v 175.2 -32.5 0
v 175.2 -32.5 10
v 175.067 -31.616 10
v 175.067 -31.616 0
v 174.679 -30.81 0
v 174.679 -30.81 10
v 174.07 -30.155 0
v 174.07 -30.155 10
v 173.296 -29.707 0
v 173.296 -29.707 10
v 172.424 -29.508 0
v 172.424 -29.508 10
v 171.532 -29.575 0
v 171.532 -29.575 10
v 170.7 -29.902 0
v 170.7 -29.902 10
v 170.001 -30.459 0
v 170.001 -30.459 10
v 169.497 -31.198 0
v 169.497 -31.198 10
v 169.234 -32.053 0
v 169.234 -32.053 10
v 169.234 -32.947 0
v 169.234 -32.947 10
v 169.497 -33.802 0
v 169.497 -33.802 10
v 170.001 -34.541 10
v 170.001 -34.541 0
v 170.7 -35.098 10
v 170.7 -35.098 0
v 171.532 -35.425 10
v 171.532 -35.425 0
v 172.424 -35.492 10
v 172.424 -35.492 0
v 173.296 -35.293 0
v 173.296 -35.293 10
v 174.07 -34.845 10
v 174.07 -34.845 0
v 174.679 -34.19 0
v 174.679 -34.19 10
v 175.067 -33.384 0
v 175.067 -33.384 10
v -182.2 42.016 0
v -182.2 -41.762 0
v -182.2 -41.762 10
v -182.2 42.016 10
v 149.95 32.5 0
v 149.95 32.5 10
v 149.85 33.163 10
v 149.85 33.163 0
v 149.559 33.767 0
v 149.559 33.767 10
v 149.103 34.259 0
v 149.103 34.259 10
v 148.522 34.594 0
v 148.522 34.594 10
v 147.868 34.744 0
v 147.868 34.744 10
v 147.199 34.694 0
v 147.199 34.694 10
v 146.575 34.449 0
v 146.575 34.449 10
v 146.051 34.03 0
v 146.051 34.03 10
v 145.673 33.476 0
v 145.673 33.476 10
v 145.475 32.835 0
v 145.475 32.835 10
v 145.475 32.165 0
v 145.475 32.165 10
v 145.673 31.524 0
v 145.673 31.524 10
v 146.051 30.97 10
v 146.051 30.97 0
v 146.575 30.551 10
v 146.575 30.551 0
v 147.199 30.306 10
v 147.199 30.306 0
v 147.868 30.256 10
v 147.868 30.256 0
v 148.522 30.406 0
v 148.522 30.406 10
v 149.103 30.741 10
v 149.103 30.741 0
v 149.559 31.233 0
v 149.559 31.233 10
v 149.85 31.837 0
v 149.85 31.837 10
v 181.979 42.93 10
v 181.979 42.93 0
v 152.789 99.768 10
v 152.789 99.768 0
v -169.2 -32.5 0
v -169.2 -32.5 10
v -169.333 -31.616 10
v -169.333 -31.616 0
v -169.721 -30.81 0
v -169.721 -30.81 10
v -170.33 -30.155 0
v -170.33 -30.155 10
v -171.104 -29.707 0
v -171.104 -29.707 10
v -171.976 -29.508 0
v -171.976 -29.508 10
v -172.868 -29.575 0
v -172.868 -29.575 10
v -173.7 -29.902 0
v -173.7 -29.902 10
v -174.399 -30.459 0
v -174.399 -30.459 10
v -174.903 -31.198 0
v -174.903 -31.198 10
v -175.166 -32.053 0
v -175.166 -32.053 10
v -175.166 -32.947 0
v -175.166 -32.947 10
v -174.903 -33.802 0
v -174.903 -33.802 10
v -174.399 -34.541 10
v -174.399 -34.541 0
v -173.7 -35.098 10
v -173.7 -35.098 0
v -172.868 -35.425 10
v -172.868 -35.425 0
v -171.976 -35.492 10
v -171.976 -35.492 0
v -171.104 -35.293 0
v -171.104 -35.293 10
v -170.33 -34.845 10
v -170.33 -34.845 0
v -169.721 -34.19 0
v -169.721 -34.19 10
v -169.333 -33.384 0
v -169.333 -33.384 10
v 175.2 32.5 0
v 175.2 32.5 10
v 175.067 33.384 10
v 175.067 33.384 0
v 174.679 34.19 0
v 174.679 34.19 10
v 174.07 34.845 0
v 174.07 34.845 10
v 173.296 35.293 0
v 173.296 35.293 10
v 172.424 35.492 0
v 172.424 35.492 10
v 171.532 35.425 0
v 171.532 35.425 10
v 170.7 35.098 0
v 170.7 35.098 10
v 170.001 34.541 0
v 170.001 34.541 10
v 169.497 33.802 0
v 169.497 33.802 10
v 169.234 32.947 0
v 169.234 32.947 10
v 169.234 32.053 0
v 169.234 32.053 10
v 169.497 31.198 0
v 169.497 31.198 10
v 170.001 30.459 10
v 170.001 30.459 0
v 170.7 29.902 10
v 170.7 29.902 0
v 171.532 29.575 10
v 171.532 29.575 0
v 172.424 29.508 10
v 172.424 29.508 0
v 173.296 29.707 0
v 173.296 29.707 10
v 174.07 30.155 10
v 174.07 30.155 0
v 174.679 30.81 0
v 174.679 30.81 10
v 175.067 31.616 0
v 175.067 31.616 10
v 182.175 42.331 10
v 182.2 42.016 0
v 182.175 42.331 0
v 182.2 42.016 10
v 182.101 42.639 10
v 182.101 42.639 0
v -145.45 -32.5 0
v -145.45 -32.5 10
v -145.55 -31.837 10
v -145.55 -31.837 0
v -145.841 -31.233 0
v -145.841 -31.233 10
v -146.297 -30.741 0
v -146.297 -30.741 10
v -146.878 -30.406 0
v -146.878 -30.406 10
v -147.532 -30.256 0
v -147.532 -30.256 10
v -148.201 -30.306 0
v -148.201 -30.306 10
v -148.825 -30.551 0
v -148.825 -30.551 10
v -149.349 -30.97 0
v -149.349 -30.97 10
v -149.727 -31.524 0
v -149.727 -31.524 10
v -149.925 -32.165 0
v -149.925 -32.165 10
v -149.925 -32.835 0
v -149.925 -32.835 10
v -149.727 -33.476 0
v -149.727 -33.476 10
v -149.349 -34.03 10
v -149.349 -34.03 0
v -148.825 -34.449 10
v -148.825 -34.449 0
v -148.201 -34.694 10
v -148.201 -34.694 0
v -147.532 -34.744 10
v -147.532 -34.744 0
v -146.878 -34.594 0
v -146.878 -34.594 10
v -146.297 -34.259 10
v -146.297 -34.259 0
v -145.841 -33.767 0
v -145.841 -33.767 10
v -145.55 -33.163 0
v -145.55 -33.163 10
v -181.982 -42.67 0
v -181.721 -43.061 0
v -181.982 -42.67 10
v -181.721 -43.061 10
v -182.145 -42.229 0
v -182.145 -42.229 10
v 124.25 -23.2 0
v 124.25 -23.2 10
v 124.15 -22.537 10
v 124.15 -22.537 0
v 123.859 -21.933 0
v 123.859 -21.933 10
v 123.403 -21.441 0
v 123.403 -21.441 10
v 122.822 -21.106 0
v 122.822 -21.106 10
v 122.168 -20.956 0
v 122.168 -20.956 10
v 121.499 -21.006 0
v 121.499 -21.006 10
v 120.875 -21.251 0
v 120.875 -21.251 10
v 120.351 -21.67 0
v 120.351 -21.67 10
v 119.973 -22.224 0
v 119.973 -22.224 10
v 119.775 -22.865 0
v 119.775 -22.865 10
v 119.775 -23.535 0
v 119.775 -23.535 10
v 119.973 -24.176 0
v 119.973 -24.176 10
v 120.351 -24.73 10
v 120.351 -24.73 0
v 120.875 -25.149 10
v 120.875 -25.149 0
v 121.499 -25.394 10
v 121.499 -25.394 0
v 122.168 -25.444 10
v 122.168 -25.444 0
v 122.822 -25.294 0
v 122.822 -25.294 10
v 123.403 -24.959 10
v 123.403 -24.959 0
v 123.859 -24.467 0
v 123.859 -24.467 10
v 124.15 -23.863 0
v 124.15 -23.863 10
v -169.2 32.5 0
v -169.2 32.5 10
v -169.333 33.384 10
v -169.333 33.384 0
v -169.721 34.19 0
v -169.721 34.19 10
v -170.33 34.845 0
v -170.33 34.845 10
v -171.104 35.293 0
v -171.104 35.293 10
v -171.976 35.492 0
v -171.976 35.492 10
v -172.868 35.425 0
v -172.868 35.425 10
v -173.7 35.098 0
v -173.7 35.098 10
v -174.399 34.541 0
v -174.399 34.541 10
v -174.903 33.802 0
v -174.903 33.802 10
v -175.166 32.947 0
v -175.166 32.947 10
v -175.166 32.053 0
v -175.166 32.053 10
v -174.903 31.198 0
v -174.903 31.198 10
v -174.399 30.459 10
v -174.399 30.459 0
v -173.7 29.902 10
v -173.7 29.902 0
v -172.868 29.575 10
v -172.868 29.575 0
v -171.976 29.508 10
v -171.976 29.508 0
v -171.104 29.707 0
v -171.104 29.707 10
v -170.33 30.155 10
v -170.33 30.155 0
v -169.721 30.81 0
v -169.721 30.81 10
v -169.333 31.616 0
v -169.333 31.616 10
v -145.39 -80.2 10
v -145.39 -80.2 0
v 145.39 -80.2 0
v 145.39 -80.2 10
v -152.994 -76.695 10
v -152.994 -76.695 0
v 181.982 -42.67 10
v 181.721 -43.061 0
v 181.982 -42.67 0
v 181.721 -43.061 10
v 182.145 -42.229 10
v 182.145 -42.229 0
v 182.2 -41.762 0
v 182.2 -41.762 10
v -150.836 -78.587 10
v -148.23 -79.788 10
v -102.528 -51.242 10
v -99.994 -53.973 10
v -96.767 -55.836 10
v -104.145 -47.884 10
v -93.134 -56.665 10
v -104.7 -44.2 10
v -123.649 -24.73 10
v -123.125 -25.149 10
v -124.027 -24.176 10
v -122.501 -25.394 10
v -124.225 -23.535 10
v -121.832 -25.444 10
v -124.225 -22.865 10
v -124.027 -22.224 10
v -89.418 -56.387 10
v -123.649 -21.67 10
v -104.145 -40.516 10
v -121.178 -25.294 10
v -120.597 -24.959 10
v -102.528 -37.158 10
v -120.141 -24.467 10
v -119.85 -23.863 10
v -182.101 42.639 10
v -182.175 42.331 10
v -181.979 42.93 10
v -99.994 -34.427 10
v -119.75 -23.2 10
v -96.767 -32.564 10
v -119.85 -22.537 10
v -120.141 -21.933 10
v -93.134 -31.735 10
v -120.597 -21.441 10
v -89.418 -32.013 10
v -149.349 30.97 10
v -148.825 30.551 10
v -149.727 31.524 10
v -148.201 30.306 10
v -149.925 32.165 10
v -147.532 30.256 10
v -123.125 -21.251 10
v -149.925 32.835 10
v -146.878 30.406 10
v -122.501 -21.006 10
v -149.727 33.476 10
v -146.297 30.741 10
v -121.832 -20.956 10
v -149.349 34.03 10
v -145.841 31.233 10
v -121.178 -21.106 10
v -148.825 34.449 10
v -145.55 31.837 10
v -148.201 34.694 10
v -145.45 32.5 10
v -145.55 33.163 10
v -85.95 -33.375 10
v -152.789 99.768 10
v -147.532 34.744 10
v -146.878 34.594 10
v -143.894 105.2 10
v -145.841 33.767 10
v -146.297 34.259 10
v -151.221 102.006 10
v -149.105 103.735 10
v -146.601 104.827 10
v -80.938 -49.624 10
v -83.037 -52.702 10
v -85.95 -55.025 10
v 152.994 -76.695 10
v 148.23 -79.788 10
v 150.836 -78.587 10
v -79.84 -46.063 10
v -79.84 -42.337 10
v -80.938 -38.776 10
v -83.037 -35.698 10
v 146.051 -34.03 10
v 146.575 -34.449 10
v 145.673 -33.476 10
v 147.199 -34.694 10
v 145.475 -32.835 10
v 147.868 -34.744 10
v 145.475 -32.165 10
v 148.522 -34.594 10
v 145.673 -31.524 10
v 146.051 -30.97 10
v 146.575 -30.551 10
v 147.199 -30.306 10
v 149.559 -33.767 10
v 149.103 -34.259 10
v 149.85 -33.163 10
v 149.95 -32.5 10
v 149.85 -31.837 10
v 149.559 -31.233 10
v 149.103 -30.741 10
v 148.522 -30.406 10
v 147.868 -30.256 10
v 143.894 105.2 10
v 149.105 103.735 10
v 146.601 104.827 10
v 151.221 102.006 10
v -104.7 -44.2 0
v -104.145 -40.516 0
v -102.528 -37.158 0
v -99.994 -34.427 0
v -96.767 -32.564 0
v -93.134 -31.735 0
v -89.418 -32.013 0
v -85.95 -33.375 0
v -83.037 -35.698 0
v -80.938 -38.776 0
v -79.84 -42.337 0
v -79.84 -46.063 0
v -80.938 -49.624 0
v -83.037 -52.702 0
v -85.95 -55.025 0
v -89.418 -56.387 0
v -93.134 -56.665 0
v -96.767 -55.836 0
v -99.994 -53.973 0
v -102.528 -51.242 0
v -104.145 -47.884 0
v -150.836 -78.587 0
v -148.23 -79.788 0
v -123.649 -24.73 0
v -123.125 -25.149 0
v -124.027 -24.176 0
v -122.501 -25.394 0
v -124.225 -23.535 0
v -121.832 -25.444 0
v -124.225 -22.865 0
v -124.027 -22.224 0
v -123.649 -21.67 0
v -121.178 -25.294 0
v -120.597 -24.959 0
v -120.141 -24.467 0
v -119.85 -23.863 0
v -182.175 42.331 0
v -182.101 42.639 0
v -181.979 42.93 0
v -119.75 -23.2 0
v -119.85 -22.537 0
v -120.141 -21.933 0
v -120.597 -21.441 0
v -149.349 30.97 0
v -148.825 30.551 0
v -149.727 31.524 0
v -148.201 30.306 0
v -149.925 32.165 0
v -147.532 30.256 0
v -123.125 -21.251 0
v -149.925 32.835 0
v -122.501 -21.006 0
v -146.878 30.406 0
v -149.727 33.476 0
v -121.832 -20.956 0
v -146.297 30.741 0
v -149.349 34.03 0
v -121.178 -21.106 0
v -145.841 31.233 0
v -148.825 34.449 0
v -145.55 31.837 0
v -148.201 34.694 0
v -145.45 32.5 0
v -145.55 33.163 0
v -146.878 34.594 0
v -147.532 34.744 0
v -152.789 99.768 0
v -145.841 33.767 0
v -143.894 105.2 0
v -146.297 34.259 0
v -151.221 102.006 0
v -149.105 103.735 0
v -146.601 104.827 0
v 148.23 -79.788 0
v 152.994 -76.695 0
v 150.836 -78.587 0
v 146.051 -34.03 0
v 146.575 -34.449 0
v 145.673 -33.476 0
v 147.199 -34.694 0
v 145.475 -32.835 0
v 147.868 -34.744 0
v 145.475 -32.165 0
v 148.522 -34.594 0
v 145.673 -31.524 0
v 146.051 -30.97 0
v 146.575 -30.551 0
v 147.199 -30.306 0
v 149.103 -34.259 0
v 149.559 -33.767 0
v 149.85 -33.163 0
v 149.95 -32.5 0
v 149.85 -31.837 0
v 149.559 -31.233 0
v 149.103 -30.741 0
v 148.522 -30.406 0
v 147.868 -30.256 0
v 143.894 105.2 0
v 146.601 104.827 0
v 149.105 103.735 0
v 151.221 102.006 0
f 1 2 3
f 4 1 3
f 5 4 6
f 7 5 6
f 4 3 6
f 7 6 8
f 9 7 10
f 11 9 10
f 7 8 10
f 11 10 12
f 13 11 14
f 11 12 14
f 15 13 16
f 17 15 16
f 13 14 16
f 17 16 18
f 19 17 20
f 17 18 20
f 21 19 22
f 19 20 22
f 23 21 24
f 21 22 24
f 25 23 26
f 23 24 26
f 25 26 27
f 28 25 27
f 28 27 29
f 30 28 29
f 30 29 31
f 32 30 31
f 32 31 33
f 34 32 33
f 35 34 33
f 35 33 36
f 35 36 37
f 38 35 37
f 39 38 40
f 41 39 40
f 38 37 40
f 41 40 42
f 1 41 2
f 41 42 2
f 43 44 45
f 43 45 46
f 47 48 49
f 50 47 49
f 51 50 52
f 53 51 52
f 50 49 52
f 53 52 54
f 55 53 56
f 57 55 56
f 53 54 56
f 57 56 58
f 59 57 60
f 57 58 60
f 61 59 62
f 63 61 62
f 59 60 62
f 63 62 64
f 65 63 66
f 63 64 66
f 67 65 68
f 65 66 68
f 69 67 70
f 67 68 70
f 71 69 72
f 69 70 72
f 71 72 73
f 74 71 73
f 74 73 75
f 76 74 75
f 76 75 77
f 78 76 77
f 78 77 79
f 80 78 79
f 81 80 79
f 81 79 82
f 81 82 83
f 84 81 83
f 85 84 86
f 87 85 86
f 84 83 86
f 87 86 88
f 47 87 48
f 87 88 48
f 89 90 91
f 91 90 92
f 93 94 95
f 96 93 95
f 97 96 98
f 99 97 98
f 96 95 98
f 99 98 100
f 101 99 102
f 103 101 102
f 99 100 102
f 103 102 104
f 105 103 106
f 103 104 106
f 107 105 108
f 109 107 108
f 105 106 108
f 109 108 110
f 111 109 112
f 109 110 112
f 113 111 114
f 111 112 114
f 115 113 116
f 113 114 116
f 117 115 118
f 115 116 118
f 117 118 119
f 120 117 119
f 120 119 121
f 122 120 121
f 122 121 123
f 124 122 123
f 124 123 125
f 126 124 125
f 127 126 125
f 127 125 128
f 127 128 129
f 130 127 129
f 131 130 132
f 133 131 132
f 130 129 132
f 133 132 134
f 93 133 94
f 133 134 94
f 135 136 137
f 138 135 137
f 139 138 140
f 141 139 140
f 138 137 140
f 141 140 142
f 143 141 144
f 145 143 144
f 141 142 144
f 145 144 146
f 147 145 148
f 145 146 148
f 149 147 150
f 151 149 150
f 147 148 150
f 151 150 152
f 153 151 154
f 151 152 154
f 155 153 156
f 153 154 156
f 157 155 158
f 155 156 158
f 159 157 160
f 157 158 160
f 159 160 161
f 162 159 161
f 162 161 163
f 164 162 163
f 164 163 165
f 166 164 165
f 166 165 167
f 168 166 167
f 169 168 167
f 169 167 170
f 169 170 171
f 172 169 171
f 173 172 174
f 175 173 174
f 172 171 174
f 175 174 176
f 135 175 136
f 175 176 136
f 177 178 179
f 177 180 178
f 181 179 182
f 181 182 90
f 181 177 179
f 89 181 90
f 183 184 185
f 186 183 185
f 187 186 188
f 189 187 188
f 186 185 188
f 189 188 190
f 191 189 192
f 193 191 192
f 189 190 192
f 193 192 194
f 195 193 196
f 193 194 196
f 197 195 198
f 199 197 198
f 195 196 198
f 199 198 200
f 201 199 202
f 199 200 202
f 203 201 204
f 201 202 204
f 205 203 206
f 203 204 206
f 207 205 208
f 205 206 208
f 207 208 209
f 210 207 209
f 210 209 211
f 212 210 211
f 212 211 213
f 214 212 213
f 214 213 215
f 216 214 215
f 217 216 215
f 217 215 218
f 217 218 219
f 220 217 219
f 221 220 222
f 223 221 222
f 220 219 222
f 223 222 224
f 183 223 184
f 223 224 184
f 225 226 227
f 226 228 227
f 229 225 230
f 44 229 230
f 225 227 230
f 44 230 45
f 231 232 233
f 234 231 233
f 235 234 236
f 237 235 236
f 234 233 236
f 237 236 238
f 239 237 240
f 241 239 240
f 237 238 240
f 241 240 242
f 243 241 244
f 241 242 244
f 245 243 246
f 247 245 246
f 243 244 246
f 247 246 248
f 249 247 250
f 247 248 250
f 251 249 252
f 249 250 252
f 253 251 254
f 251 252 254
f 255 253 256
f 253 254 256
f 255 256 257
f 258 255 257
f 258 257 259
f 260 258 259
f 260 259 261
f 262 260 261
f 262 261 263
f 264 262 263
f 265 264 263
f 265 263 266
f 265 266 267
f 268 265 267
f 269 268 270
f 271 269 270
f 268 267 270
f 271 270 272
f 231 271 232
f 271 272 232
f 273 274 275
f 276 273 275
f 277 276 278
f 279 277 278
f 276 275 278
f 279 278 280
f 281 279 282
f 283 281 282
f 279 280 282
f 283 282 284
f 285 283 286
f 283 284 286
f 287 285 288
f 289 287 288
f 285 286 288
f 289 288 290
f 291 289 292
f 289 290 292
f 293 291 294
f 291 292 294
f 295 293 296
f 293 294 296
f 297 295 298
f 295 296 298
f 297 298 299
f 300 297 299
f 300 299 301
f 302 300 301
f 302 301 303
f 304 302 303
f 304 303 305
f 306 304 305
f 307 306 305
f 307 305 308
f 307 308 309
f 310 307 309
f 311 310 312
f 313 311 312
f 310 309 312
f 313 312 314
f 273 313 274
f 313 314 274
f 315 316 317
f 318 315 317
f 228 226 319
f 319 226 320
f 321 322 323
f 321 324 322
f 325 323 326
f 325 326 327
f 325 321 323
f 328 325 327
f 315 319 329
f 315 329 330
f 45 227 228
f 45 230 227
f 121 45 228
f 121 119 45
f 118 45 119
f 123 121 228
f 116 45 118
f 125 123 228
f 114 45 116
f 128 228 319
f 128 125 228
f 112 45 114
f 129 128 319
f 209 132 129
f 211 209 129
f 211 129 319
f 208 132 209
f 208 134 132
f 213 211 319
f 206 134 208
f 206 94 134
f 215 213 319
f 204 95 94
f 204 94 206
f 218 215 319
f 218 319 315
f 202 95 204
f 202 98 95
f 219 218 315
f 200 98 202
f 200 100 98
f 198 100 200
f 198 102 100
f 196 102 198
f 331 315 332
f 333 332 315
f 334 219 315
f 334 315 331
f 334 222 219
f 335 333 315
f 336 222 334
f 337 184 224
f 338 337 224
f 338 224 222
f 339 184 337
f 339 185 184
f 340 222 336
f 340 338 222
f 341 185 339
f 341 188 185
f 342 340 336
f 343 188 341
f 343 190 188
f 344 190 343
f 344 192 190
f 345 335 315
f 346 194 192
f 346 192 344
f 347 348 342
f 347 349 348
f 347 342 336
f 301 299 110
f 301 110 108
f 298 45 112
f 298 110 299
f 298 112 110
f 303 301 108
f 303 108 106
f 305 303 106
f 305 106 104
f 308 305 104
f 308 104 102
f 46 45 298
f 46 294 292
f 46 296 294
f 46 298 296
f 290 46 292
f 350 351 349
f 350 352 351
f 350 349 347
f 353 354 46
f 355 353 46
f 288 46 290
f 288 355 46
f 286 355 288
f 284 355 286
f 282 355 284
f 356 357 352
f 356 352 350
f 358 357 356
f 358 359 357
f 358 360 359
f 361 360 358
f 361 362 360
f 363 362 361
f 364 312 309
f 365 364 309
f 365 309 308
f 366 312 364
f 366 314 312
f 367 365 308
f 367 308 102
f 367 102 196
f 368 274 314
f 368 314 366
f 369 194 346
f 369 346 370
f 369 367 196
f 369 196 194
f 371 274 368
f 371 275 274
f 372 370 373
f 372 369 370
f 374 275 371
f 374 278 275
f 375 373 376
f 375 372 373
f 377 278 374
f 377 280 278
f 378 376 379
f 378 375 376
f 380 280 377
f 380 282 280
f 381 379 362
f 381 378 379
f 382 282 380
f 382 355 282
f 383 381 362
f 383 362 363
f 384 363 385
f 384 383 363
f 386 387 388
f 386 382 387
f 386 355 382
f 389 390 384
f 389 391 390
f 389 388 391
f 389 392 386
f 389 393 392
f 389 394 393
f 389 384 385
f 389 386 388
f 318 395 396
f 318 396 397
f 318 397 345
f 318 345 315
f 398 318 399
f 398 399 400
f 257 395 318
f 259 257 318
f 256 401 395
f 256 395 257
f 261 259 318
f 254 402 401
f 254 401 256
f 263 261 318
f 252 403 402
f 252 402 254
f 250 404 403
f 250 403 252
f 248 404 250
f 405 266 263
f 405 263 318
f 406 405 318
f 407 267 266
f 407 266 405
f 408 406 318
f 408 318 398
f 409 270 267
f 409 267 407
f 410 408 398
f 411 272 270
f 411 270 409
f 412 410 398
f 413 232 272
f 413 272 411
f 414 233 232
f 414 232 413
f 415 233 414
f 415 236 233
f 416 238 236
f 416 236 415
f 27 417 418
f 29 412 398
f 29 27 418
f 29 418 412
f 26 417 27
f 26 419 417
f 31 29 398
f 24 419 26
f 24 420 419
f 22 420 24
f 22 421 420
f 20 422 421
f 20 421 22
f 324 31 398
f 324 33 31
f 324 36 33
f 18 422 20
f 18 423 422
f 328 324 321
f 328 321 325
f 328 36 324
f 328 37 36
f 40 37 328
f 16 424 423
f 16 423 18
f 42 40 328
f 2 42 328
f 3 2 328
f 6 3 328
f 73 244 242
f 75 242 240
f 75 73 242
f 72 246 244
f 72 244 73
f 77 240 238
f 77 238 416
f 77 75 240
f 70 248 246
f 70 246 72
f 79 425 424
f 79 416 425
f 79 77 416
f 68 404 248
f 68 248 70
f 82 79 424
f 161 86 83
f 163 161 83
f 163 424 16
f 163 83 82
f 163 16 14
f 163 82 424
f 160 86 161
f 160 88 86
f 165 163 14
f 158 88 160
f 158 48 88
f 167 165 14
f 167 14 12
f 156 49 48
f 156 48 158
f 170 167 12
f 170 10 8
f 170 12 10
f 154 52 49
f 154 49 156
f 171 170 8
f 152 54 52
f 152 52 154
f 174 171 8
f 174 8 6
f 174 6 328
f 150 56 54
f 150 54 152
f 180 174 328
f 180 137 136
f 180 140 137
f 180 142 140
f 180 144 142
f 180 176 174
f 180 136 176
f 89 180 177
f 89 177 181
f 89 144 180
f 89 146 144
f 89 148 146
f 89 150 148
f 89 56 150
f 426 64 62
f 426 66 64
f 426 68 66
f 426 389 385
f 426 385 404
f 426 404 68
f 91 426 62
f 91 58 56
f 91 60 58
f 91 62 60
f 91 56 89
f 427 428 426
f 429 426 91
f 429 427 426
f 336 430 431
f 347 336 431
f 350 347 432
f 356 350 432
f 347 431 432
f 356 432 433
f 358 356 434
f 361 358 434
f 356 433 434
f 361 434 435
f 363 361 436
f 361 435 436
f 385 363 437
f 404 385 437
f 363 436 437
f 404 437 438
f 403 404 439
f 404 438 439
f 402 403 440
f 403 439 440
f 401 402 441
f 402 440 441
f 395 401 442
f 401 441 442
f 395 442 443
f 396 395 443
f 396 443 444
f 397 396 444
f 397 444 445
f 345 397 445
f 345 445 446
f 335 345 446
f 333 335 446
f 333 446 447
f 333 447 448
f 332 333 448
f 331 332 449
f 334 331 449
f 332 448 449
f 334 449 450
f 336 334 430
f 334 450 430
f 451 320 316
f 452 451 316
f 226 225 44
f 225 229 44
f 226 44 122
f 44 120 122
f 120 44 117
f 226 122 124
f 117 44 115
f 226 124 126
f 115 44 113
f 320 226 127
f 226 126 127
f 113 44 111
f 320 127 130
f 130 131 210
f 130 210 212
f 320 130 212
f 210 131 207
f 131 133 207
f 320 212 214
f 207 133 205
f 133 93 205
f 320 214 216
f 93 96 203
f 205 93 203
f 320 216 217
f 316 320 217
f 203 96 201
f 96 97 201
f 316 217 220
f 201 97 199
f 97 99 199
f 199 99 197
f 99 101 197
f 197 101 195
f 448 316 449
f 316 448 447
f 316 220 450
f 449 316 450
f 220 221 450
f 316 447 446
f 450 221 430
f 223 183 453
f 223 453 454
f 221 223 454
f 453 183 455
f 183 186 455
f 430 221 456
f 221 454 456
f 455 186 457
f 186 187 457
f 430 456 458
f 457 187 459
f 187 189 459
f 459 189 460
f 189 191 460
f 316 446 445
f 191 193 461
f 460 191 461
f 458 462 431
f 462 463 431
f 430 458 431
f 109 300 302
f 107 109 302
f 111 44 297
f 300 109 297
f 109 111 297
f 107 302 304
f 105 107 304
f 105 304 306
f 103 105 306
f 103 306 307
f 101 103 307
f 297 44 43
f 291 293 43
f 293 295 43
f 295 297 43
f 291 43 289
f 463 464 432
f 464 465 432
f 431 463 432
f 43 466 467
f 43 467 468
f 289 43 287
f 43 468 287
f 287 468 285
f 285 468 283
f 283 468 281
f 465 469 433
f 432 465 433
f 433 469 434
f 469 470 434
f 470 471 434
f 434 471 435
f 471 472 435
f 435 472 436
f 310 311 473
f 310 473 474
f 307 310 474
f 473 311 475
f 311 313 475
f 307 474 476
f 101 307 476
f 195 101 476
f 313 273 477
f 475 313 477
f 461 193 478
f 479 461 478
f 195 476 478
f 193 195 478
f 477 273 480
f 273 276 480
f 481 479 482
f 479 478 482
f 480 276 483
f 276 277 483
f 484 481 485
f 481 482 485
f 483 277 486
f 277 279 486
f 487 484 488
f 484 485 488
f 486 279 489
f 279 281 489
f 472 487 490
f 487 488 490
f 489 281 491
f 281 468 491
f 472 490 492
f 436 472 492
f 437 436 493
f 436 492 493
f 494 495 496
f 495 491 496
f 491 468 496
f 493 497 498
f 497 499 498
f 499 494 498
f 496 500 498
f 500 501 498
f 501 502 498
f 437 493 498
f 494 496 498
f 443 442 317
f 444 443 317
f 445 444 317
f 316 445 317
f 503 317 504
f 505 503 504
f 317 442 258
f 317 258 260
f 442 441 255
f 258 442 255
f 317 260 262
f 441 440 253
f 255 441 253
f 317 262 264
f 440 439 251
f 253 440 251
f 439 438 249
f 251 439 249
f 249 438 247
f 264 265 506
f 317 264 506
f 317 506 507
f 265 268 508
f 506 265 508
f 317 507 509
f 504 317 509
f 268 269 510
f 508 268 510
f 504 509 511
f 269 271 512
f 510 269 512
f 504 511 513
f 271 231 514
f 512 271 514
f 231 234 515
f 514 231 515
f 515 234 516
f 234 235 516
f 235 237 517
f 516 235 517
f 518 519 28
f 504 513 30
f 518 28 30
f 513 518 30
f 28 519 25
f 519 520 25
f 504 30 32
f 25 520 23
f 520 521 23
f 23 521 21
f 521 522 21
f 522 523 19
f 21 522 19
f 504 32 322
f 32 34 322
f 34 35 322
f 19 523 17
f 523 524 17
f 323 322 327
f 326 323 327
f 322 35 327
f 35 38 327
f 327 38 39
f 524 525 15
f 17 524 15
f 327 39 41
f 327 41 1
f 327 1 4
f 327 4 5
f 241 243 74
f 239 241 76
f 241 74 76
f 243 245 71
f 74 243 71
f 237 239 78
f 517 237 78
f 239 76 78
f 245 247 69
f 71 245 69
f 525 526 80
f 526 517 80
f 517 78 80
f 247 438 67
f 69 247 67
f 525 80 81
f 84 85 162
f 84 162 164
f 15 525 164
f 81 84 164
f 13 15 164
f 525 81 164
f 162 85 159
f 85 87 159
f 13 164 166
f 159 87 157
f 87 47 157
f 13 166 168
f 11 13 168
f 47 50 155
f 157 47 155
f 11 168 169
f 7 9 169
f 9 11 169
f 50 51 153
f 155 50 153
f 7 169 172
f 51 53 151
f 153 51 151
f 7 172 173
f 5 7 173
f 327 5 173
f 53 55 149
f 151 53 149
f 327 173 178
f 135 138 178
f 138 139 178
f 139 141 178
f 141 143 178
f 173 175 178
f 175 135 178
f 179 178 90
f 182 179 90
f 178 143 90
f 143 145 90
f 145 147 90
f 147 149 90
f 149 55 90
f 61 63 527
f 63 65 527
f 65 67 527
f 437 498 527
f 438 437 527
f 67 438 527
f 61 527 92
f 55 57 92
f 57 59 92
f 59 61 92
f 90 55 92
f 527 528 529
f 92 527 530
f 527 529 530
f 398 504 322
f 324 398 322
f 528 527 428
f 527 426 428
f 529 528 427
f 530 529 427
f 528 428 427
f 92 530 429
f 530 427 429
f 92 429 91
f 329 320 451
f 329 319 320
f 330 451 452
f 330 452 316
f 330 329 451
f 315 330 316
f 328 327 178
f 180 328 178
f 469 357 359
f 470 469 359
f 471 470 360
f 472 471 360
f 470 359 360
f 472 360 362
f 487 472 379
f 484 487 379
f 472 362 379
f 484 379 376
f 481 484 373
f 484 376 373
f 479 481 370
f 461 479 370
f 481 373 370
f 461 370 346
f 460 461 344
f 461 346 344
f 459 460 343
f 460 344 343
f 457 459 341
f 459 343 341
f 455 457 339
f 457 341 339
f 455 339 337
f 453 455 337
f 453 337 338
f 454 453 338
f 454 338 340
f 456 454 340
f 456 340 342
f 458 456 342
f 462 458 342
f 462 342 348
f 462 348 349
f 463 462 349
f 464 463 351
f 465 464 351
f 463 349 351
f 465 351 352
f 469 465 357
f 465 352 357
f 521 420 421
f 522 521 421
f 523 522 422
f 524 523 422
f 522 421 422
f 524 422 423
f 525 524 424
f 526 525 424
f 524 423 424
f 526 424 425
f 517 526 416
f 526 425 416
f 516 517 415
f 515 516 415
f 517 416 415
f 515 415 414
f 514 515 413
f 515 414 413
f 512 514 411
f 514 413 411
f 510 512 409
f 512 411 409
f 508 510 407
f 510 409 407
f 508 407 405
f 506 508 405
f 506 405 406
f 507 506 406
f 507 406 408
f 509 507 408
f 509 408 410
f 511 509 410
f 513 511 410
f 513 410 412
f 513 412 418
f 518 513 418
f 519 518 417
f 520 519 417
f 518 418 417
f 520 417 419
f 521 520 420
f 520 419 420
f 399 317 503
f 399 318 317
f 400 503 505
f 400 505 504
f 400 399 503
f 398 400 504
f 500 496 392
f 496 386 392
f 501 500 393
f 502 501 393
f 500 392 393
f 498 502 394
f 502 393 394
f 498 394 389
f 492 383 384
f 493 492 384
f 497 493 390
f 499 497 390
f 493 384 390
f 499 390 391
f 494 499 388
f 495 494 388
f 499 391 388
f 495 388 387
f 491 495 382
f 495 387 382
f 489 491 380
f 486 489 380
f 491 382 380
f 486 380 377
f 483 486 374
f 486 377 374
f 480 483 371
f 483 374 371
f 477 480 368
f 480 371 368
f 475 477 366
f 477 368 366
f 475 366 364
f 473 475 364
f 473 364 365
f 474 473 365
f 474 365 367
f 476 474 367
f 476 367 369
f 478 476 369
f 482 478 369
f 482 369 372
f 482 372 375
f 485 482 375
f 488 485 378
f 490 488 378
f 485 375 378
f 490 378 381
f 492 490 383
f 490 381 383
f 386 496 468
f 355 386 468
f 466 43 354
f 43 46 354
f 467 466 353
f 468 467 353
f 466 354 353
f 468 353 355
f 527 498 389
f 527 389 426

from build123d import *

# Parameters (mm, degrees)
ESQUISSE1_W             = 364.4
ESQUISSE1_H             = 85
ESQUISSE1_W_2           = 300
ESQUISSE1_H_2           = 62.7
ESQUISSE1_H_3           = 37.7
BOSS_EXTRU_1_DEPTH      = 10
ESQUISSE3_R             = 2.25
ESQUISSE3_R_2           = 3
ENL_V_MAT_EXTRU_1_DEPTH = 10
ESQUISSE4_R             = 2.25
ENL_V_MAT_EXTRU_2_DEPTH = 10
CONG_1_R                = 10
CONG_2_R                = 2
ESQUISSE5_R             = 12.5
ENL_V_MAT_EXTRU_3_DEPTH = 10


with BuildPart() as part:
    # Esquisse1 → Boss.-Extru.1 (new body)
    with BuildSketch(Plane.XY):
        Rectangle(ESQUISSE1_W, ESQUISSE1_H)
        with Locations((0, 73.85)):
            Rectangle(ESQUISSE1_W_2, ESQUISSE1_H_2)
        Polygon((-150, 105.2), (-182.2, 42.5), (-150, 42.5), align=None)
        with Locations((0, -61.35)):
            Rectangle(ESQUISSE1_W_2, ESQUISSE1_H_3)
        Polygon((-150, -42.5), (-182.2, -42.5), (-150, -80.2), align=None)
        Polygon((182.2, 42.5), (150, 105.2), (150, 42.5), align=None)
        Polygon((182.2, -42.5), (150, -42.5), (150, -80.2), align=None)
    extrude(amount=BOSS_EXTRU_1_DEPTH)

    # Esquisse3 → Enlèv. mat.-Extru.1 (cut)
    with BuildSketch(Plane.XY.offset(10)):
        with Locations((-147.7, 32.5)):
            Circle(ESQUISSE3_R)
        with Locations((-172.2, 32.5)):
            Circle(ESQUISSE3_R_2)
        with Locations((-172.2, -32.5)):
            Circle(ESQUISSE3_R_2)
        with Locations((-147.7, -32.5)):
            Circle(ESQUISSE3_R)
        with Locations((172.2, -32.5)):
            Circle(ESQUISSE3_R_2)
        with Locations((147.7, -32.5)):
            Circle(ESQUISSE3_R)
        with Locations((172.2, 32.5)):
            Circle(ESQUISSE3_R_2)
        with Locations((147.7, 32.5)):
            Circle(ESQUISSE3_R)
    extrude(amount=-ENL_V_MAT_EXTRU_1_DEPTH, mode=Mode.SUBTRACT)

    # Esquisse4 → Enlèv. mat.-Extru.2 (cut)
    with BuildSketch(Plane.XY.offset(10)):
        with Locations((-122, -23.2)):
            Circle(ESQUISSE4_R)
        with Locations((122, -23.2)):
            Circle(ESQUISSE4_R)
    extrude(amount=-ENL_V_MAT_EXTRU_2_DEPTH, mode=Mode.SUBTRACT)

    # Congé1
    cong_1_edges = [part.edges().sort_by_distance(p)[0] for p in [
        (-150, -80.2, 5),
        (-150, 105.2, 5),
        (150, 105.2, 5),
        (150, -80.2, 5),
    ]]
    fillet(cong_1_edges, radius=CONG_1_R)

    # Congé2
    cong_2_edges = [part.edges().sort_by_distance(p)[0] for p in [
        (-182.2, -42.5, 5),
        (-182.2, 42.5, 5),
        (182.2, 42.5, 5),
        (182.2, -42.5, 5),
    ]]
    fillet(cong_2_edges, radius=CONG_2_R)

    # Esquisse5 → Enlèv. mat.-Extru.3 (cut)
    with BuildSketch(Plane(origin=(0, 0, 0), x_dir=(-1, 0, 0), z_dir=(0, 0, -1))):
        with Locations((92.2, -44.2)):
            Circle(ESQUISSE5_R)
    extrude(amount=-ENL_V_MAT_EXTRU_3_DEPTH, mode=Mode.SUBTRACT)


solid = part.part
